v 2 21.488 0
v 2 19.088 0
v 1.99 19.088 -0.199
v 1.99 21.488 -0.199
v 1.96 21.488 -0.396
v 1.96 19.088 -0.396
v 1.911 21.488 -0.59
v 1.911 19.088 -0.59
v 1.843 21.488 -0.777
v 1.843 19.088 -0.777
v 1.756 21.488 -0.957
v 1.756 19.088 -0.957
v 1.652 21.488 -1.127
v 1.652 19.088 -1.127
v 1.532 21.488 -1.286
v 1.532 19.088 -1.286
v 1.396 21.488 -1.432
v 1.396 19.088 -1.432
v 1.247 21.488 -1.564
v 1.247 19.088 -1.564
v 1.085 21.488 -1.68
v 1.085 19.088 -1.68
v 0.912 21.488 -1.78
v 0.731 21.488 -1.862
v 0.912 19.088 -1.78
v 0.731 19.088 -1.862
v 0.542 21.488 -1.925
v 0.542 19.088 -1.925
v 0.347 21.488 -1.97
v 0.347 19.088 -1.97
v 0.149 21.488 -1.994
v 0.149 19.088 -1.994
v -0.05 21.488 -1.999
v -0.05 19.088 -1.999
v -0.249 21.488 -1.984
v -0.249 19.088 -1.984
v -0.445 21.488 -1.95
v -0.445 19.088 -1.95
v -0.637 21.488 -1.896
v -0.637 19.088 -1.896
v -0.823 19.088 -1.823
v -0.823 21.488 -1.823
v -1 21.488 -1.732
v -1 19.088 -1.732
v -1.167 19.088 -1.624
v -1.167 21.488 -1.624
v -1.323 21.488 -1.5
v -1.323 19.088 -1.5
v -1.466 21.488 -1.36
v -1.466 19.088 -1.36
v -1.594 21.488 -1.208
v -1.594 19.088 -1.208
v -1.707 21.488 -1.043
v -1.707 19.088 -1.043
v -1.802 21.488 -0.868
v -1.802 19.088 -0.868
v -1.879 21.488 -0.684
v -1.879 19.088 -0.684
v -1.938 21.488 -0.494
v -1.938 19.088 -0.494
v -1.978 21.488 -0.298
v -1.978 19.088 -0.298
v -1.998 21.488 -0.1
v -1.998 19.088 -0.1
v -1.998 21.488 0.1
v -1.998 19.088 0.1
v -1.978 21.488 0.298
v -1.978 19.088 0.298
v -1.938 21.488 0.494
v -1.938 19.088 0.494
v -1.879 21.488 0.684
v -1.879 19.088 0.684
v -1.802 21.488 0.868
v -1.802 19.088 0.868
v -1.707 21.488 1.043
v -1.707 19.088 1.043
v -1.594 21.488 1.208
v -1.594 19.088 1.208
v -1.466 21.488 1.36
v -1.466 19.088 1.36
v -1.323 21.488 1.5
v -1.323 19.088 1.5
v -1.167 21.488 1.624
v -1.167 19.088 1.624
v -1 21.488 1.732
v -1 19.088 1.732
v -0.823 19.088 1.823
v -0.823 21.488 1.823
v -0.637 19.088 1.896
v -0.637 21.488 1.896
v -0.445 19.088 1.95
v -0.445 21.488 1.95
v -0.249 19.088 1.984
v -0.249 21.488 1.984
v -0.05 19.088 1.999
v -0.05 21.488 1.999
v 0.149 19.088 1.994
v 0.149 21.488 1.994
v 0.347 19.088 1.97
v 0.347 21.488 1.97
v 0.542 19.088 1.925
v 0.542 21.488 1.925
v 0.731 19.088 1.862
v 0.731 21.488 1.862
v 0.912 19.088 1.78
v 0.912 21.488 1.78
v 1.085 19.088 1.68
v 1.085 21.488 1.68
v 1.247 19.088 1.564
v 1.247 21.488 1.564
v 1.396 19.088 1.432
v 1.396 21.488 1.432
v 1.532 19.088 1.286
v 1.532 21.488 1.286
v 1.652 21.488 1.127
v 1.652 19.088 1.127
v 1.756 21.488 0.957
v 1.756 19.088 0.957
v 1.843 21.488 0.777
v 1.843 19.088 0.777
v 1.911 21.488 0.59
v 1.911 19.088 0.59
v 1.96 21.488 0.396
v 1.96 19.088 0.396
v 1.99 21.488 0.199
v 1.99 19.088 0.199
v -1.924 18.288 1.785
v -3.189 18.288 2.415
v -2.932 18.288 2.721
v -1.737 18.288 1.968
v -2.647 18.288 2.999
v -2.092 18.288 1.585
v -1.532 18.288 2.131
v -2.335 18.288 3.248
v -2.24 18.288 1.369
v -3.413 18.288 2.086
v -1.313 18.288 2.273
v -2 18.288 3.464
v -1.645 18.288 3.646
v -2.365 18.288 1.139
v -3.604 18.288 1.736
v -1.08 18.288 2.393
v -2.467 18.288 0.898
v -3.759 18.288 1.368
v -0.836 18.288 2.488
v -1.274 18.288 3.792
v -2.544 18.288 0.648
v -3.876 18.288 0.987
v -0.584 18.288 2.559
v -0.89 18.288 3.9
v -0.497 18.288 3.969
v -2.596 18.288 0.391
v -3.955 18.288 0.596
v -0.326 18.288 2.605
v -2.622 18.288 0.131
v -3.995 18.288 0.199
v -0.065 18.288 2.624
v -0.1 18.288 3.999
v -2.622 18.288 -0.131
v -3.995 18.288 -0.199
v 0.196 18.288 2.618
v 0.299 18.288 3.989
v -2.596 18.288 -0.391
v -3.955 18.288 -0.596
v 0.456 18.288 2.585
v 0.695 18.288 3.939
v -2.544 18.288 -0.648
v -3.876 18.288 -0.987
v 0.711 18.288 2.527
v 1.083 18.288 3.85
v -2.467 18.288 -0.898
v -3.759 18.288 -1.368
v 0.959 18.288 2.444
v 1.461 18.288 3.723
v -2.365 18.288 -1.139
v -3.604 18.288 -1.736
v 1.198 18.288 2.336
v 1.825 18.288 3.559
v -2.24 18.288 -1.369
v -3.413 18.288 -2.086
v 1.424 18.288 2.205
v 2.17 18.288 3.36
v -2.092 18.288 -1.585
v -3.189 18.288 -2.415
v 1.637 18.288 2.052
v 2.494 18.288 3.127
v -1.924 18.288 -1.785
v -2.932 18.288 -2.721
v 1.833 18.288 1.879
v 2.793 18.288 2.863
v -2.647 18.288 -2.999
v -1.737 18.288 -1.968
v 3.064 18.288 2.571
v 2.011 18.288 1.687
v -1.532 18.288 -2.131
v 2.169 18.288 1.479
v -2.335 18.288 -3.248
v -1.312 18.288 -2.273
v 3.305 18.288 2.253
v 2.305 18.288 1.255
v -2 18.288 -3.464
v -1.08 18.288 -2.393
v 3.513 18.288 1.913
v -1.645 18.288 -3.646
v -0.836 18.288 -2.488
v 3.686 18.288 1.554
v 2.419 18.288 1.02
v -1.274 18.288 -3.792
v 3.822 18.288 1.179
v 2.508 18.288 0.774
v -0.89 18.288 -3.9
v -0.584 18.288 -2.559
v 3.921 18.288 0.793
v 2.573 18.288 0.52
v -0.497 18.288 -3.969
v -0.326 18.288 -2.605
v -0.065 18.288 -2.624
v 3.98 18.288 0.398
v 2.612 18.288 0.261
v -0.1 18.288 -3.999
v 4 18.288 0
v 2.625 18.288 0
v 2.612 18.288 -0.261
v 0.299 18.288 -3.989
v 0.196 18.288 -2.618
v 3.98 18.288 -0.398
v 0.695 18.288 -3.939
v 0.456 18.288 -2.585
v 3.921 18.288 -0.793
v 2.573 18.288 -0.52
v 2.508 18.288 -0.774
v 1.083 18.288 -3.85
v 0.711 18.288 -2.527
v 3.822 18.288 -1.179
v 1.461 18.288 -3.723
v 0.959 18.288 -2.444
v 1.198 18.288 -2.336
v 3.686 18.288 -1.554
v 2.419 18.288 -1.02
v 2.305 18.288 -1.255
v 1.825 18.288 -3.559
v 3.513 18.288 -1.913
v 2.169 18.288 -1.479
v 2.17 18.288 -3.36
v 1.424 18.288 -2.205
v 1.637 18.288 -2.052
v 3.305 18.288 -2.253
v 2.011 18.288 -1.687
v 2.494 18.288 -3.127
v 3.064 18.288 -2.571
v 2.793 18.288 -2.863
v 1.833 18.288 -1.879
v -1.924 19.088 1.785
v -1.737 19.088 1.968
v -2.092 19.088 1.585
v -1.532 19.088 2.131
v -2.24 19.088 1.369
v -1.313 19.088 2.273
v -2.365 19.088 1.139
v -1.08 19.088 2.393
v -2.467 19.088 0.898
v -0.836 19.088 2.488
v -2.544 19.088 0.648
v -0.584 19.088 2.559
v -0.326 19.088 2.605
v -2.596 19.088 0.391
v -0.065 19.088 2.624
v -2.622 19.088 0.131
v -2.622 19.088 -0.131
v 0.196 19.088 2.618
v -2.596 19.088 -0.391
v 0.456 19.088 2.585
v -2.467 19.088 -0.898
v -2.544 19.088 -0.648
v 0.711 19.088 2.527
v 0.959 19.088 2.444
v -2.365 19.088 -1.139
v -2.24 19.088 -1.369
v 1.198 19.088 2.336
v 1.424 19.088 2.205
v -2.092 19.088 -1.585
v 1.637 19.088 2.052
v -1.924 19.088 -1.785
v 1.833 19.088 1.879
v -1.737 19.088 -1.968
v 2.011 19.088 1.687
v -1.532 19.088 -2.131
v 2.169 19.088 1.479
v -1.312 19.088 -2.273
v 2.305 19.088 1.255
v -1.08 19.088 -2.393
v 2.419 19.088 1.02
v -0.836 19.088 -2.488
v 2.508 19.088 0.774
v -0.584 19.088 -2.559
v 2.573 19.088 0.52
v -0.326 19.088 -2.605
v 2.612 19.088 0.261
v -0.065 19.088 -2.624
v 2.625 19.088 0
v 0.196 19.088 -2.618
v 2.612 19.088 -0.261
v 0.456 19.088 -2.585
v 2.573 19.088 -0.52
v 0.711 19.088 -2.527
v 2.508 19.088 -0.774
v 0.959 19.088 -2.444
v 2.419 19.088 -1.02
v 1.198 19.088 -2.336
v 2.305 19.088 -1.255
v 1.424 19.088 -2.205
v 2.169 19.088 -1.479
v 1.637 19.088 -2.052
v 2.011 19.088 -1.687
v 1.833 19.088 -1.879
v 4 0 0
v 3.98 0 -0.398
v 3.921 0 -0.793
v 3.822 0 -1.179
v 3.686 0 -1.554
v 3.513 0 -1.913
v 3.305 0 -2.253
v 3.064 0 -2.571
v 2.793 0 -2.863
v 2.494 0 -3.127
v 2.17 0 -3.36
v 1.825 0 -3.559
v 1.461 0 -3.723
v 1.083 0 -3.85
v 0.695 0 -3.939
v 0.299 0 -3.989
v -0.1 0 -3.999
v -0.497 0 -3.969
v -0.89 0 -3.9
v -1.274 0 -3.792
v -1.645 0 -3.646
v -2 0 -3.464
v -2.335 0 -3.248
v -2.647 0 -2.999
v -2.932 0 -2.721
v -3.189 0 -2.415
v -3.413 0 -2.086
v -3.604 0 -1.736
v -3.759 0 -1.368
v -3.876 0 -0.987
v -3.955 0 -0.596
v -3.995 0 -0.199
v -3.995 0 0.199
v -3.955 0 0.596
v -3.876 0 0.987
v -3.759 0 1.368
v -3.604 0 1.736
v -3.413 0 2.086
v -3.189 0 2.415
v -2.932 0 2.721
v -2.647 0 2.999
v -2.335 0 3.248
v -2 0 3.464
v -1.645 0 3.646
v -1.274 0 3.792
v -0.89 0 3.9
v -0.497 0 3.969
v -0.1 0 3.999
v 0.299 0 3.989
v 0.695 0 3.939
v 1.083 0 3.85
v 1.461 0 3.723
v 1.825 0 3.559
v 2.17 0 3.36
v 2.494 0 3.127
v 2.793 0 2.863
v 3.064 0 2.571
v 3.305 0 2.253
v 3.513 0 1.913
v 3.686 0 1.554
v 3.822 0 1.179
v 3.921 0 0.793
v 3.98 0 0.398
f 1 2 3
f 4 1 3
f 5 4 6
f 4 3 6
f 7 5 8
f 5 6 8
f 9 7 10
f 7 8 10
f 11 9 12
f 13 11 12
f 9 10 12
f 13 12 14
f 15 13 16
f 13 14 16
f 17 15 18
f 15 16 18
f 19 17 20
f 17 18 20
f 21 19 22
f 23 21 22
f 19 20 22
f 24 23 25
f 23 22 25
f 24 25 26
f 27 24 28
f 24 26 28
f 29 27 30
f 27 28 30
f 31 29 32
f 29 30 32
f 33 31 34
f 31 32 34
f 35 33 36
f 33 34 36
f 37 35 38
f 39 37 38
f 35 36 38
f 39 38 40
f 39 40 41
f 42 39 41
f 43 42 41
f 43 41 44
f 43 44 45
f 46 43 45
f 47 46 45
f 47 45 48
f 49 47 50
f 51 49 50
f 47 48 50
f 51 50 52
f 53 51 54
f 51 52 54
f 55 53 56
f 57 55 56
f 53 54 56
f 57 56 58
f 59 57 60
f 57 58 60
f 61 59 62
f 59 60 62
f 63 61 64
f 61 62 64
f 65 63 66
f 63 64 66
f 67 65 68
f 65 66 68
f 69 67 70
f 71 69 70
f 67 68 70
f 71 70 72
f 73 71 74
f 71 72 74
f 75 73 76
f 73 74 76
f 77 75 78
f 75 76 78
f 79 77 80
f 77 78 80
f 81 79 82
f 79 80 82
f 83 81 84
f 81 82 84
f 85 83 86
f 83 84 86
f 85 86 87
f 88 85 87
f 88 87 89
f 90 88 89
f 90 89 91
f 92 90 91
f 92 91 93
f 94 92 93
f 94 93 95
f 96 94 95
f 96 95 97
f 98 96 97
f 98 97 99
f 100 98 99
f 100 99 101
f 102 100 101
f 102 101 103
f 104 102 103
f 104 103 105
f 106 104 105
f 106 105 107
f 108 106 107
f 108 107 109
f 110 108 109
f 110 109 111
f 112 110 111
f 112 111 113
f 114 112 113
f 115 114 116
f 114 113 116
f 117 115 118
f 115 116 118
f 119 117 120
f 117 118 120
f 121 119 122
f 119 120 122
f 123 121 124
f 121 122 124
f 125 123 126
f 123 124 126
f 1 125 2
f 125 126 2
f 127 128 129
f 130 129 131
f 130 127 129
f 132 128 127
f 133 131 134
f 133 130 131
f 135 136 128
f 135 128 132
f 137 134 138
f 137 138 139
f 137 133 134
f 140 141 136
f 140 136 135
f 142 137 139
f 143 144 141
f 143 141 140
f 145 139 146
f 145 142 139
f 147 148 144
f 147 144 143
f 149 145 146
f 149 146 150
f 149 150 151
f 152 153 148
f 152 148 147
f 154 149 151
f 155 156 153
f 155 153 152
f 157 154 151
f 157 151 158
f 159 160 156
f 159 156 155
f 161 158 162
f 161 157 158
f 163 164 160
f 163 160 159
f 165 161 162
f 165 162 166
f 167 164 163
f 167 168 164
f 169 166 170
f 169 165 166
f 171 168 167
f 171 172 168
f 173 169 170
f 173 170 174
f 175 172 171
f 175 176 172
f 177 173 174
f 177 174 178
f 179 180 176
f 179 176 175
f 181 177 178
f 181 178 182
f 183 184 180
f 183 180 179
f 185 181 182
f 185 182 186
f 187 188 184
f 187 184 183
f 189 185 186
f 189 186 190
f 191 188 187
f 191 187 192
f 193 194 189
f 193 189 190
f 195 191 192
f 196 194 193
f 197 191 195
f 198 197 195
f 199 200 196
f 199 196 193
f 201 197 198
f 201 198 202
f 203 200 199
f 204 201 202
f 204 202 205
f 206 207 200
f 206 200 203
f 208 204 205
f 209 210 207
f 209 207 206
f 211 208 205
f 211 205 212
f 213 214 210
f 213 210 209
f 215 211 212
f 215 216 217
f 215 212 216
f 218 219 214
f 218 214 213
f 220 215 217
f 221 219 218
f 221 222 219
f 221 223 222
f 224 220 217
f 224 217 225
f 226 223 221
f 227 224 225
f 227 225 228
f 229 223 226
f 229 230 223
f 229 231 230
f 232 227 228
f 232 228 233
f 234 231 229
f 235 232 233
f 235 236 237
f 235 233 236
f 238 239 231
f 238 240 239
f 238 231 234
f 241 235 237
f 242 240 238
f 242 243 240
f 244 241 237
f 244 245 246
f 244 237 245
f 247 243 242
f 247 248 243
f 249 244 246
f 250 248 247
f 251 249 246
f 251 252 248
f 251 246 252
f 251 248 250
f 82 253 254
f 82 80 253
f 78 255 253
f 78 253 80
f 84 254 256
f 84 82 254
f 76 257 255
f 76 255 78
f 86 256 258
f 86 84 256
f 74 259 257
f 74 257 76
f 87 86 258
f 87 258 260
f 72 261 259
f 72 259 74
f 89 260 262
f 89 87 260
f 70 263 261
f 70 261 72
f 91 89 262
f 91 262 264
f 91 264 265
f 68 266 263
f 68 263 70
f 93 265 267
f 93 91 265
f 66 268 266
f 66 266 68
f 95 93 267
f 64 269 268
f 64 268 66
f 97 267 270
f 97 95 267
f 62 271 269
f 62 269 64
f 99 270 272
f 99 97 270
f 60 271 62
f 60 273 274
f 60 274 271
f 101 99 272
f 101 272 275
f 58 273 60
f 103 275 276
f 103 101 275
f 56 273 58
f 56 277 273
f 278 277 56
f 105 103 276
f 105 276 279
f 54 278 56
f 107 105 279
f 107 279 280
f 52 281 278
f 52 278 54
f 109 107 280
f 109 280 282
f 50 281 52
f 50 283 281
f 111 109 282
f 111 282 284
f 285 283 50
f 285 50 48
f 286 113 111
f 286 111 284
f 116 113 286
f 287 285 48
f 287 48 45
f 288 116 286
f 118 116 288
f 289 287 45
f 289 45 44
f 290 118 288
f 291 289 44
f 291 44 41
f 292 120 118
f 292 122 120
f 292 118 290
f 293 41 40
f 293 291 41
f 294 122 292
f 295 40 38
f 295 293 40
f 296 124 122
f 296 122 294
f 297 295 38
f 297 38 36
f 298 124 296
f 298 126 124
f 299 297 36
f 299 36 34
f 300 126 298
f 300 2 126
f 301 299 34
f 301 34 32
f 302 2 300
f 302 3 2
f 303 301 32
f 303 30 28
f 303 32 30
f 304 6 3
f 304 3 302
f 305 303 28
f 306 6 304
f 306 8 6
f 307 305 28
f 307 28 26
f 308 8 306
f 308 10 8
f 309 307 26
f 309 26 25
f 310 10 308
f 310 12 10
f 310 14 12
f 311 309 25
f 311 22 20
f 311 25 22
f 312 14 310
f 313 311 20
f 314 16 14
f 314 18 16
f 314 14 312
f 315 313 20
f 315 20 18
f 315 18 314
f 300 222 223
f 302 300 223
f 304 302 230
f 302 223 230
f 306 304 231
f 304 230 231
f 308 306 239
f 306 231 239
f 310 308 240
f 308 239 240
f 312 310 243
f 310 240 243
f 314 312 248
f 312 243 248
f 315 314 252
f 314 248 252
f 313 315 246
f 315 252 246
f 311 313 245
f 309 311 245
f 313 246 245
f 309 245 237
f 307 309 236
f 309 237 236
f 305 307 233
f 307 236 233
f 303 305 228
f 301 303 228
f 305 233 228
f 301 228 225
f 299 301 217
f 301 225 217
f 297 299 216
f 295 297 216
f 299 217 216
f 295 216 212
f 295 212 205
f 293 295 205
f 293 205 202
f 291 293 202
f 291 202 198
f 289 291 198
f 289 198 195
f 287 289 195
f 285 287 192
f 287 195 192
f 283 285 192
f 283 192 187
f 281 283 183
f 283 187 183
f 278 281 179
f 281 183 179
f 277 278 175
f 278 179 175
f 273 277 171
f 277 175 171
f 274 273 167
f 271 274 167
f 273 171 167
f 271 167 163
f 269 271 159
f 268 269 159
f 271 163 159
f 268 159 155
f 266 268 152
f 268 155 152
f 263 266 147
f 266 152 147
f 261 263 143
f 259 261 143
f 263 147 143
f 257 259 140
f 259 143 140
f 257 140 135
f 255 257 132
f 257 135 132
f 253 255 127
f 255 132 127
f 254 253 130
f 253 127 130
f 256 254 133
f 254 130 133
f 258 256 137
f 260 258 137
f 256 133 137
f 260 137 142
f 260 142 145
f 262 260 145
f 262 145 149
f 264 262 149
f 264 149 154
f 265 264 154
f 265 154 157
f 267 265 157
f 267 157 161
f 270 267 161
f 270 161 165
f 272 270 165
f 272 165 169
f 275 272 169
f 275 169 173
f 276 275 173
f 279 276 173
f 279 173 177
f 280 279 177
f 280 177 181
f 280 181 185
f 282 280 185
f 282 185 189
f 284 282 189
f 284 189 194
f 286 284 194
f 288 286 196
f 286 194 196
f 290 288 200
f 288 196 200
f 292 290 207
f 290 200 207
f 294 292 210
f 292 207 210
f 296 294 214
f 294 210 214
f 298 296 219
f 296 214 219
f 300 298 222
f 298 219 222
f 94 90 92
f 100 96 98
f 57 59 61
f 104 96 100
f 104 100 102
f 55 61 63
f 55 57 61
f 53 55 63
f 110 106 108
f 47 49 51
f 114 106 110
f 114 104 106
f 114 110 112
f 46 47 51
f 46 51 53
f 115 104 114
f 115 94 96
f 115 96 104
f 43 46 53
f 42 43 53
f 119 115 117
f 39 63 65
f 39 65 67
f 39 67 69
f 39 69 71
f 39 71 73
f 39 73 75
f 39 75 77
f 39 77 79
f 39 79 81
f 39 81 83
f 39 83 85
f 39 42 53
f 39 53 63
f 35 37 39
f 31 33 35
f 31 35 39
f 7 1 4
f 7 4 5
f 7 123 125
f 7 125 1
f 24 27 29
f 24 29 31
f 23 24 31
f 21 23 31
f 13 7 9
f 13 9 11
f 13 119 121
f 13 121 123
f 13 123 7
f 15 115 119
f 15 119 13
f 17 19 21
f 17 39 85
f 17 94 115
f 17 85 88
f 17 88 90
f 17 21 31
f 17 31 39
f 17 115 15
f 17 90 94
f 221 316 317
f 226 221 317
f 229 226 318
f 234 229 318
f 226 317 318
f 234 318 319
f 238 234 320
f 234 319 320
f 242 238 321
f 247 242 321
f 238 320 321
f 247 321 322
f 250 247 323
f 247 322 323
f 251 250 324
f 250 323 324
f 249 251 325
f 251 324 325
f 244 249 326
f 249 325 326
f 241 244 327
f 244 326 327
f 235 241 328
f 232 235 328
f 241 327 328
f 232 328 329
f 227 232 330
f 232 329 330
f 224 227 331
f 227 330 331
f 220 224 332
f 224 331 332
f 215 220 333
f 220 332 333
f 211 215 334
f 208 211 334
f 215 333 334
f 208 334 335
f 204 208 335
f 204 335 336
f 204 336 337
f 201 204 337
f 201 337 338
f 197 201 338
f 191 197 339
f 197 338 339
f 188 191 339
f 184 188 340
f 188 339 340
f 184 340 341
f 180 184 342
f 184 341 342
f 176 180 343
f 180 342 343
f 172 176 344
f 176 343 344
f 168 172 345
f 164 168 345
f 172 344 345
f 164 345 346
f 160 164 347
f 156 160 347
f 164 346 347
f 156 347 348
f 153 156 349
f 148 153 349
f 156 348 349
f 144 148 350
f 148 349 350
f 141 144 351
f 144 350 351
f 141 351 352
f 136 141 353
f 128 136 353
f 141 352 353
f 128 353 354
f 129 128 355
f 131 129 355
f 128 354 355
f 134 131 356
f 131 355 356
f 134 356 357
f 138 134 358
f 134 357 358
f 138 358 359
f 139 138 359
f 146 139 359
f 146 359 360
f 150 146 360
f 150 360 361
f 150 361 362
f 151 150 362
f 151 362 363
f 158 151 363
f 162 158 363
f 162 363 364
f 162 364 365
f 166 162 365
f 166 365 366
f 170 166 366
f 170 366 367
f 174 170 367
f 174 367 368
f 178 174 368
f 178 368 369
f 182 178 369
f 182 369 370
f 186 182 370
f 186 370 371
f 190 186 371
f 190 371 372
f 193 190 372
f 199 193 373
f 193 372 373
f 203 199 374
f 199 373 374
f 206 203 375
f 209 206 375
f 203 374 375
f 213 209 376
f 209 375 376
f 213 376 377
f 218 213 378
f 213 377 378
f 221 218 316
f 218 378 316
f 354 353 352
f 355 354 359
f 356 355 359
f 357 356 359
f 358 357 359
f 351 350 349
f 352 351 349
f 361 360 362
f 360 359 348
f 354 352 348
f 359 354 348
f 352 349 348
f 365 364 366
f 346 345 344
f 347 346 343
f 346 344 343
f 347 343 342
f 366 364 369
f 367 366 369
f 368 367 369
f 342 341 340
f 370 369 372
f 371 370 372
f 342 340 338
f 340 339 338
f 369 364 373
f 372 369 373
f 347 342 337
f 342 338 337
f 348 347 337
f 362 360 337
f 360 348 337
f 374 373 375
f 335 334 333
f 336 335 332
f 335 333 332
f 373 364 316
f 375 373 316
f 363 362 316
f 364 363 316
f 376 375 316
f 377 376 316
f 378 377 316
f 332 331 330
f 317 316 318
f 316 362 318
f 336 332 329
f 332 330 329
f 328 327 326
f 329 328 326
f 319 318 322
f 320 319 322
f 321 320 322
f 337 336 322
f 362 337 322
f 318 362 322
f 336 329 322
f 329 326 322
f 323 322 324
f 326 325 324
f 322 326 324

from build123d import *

# Parameters (mm, degrees)
SKETCH1_R           = 4
BOSS_EXTRUDE1_DEPTH = 18.288
SKETCH2_R           = 2.625
BOSS_EXTRUDE2_DEPTH = 0.8
SKETCH3_R           = 2
BOSS_EXTRUDE3_DEPTH = 2.4


with BuildPart() as part:
    # Sketch1 → Boss-Extrude1 (new body)
    with BuildSketch(Plane(origin=(0, 0, 0), x_dir=(1, 0, 0), z_dir=(0, 1, 0))):
        Circle(SKETCH1_R)
    extrude(amount=BOSS_EXTRUDE1_DEPTH)

    # Sketch2 → Boss-Extrude2 (add)
    with BuildSketch(Plane(origin=(0, 18.288, 0), x_dir=(1, 0, 0), z_dir=(0, 1, 0))):
        Circle(SKETCH2_R)
    extrude(amount=BOSS_EXTRUDE2_DEPTH)

    # Sketch3 → Boss-Extrude3 (add)
    with BuildSketch(Plane(origin=(0, 19.088, 0), x_dir=(1, 0, 0), z_dir=(0, 1, 0))):
        Circle(SKETCH3_R)
    extrude(amount=BOSS_EXTRUDE3_DEPTH)


solid = part.part
